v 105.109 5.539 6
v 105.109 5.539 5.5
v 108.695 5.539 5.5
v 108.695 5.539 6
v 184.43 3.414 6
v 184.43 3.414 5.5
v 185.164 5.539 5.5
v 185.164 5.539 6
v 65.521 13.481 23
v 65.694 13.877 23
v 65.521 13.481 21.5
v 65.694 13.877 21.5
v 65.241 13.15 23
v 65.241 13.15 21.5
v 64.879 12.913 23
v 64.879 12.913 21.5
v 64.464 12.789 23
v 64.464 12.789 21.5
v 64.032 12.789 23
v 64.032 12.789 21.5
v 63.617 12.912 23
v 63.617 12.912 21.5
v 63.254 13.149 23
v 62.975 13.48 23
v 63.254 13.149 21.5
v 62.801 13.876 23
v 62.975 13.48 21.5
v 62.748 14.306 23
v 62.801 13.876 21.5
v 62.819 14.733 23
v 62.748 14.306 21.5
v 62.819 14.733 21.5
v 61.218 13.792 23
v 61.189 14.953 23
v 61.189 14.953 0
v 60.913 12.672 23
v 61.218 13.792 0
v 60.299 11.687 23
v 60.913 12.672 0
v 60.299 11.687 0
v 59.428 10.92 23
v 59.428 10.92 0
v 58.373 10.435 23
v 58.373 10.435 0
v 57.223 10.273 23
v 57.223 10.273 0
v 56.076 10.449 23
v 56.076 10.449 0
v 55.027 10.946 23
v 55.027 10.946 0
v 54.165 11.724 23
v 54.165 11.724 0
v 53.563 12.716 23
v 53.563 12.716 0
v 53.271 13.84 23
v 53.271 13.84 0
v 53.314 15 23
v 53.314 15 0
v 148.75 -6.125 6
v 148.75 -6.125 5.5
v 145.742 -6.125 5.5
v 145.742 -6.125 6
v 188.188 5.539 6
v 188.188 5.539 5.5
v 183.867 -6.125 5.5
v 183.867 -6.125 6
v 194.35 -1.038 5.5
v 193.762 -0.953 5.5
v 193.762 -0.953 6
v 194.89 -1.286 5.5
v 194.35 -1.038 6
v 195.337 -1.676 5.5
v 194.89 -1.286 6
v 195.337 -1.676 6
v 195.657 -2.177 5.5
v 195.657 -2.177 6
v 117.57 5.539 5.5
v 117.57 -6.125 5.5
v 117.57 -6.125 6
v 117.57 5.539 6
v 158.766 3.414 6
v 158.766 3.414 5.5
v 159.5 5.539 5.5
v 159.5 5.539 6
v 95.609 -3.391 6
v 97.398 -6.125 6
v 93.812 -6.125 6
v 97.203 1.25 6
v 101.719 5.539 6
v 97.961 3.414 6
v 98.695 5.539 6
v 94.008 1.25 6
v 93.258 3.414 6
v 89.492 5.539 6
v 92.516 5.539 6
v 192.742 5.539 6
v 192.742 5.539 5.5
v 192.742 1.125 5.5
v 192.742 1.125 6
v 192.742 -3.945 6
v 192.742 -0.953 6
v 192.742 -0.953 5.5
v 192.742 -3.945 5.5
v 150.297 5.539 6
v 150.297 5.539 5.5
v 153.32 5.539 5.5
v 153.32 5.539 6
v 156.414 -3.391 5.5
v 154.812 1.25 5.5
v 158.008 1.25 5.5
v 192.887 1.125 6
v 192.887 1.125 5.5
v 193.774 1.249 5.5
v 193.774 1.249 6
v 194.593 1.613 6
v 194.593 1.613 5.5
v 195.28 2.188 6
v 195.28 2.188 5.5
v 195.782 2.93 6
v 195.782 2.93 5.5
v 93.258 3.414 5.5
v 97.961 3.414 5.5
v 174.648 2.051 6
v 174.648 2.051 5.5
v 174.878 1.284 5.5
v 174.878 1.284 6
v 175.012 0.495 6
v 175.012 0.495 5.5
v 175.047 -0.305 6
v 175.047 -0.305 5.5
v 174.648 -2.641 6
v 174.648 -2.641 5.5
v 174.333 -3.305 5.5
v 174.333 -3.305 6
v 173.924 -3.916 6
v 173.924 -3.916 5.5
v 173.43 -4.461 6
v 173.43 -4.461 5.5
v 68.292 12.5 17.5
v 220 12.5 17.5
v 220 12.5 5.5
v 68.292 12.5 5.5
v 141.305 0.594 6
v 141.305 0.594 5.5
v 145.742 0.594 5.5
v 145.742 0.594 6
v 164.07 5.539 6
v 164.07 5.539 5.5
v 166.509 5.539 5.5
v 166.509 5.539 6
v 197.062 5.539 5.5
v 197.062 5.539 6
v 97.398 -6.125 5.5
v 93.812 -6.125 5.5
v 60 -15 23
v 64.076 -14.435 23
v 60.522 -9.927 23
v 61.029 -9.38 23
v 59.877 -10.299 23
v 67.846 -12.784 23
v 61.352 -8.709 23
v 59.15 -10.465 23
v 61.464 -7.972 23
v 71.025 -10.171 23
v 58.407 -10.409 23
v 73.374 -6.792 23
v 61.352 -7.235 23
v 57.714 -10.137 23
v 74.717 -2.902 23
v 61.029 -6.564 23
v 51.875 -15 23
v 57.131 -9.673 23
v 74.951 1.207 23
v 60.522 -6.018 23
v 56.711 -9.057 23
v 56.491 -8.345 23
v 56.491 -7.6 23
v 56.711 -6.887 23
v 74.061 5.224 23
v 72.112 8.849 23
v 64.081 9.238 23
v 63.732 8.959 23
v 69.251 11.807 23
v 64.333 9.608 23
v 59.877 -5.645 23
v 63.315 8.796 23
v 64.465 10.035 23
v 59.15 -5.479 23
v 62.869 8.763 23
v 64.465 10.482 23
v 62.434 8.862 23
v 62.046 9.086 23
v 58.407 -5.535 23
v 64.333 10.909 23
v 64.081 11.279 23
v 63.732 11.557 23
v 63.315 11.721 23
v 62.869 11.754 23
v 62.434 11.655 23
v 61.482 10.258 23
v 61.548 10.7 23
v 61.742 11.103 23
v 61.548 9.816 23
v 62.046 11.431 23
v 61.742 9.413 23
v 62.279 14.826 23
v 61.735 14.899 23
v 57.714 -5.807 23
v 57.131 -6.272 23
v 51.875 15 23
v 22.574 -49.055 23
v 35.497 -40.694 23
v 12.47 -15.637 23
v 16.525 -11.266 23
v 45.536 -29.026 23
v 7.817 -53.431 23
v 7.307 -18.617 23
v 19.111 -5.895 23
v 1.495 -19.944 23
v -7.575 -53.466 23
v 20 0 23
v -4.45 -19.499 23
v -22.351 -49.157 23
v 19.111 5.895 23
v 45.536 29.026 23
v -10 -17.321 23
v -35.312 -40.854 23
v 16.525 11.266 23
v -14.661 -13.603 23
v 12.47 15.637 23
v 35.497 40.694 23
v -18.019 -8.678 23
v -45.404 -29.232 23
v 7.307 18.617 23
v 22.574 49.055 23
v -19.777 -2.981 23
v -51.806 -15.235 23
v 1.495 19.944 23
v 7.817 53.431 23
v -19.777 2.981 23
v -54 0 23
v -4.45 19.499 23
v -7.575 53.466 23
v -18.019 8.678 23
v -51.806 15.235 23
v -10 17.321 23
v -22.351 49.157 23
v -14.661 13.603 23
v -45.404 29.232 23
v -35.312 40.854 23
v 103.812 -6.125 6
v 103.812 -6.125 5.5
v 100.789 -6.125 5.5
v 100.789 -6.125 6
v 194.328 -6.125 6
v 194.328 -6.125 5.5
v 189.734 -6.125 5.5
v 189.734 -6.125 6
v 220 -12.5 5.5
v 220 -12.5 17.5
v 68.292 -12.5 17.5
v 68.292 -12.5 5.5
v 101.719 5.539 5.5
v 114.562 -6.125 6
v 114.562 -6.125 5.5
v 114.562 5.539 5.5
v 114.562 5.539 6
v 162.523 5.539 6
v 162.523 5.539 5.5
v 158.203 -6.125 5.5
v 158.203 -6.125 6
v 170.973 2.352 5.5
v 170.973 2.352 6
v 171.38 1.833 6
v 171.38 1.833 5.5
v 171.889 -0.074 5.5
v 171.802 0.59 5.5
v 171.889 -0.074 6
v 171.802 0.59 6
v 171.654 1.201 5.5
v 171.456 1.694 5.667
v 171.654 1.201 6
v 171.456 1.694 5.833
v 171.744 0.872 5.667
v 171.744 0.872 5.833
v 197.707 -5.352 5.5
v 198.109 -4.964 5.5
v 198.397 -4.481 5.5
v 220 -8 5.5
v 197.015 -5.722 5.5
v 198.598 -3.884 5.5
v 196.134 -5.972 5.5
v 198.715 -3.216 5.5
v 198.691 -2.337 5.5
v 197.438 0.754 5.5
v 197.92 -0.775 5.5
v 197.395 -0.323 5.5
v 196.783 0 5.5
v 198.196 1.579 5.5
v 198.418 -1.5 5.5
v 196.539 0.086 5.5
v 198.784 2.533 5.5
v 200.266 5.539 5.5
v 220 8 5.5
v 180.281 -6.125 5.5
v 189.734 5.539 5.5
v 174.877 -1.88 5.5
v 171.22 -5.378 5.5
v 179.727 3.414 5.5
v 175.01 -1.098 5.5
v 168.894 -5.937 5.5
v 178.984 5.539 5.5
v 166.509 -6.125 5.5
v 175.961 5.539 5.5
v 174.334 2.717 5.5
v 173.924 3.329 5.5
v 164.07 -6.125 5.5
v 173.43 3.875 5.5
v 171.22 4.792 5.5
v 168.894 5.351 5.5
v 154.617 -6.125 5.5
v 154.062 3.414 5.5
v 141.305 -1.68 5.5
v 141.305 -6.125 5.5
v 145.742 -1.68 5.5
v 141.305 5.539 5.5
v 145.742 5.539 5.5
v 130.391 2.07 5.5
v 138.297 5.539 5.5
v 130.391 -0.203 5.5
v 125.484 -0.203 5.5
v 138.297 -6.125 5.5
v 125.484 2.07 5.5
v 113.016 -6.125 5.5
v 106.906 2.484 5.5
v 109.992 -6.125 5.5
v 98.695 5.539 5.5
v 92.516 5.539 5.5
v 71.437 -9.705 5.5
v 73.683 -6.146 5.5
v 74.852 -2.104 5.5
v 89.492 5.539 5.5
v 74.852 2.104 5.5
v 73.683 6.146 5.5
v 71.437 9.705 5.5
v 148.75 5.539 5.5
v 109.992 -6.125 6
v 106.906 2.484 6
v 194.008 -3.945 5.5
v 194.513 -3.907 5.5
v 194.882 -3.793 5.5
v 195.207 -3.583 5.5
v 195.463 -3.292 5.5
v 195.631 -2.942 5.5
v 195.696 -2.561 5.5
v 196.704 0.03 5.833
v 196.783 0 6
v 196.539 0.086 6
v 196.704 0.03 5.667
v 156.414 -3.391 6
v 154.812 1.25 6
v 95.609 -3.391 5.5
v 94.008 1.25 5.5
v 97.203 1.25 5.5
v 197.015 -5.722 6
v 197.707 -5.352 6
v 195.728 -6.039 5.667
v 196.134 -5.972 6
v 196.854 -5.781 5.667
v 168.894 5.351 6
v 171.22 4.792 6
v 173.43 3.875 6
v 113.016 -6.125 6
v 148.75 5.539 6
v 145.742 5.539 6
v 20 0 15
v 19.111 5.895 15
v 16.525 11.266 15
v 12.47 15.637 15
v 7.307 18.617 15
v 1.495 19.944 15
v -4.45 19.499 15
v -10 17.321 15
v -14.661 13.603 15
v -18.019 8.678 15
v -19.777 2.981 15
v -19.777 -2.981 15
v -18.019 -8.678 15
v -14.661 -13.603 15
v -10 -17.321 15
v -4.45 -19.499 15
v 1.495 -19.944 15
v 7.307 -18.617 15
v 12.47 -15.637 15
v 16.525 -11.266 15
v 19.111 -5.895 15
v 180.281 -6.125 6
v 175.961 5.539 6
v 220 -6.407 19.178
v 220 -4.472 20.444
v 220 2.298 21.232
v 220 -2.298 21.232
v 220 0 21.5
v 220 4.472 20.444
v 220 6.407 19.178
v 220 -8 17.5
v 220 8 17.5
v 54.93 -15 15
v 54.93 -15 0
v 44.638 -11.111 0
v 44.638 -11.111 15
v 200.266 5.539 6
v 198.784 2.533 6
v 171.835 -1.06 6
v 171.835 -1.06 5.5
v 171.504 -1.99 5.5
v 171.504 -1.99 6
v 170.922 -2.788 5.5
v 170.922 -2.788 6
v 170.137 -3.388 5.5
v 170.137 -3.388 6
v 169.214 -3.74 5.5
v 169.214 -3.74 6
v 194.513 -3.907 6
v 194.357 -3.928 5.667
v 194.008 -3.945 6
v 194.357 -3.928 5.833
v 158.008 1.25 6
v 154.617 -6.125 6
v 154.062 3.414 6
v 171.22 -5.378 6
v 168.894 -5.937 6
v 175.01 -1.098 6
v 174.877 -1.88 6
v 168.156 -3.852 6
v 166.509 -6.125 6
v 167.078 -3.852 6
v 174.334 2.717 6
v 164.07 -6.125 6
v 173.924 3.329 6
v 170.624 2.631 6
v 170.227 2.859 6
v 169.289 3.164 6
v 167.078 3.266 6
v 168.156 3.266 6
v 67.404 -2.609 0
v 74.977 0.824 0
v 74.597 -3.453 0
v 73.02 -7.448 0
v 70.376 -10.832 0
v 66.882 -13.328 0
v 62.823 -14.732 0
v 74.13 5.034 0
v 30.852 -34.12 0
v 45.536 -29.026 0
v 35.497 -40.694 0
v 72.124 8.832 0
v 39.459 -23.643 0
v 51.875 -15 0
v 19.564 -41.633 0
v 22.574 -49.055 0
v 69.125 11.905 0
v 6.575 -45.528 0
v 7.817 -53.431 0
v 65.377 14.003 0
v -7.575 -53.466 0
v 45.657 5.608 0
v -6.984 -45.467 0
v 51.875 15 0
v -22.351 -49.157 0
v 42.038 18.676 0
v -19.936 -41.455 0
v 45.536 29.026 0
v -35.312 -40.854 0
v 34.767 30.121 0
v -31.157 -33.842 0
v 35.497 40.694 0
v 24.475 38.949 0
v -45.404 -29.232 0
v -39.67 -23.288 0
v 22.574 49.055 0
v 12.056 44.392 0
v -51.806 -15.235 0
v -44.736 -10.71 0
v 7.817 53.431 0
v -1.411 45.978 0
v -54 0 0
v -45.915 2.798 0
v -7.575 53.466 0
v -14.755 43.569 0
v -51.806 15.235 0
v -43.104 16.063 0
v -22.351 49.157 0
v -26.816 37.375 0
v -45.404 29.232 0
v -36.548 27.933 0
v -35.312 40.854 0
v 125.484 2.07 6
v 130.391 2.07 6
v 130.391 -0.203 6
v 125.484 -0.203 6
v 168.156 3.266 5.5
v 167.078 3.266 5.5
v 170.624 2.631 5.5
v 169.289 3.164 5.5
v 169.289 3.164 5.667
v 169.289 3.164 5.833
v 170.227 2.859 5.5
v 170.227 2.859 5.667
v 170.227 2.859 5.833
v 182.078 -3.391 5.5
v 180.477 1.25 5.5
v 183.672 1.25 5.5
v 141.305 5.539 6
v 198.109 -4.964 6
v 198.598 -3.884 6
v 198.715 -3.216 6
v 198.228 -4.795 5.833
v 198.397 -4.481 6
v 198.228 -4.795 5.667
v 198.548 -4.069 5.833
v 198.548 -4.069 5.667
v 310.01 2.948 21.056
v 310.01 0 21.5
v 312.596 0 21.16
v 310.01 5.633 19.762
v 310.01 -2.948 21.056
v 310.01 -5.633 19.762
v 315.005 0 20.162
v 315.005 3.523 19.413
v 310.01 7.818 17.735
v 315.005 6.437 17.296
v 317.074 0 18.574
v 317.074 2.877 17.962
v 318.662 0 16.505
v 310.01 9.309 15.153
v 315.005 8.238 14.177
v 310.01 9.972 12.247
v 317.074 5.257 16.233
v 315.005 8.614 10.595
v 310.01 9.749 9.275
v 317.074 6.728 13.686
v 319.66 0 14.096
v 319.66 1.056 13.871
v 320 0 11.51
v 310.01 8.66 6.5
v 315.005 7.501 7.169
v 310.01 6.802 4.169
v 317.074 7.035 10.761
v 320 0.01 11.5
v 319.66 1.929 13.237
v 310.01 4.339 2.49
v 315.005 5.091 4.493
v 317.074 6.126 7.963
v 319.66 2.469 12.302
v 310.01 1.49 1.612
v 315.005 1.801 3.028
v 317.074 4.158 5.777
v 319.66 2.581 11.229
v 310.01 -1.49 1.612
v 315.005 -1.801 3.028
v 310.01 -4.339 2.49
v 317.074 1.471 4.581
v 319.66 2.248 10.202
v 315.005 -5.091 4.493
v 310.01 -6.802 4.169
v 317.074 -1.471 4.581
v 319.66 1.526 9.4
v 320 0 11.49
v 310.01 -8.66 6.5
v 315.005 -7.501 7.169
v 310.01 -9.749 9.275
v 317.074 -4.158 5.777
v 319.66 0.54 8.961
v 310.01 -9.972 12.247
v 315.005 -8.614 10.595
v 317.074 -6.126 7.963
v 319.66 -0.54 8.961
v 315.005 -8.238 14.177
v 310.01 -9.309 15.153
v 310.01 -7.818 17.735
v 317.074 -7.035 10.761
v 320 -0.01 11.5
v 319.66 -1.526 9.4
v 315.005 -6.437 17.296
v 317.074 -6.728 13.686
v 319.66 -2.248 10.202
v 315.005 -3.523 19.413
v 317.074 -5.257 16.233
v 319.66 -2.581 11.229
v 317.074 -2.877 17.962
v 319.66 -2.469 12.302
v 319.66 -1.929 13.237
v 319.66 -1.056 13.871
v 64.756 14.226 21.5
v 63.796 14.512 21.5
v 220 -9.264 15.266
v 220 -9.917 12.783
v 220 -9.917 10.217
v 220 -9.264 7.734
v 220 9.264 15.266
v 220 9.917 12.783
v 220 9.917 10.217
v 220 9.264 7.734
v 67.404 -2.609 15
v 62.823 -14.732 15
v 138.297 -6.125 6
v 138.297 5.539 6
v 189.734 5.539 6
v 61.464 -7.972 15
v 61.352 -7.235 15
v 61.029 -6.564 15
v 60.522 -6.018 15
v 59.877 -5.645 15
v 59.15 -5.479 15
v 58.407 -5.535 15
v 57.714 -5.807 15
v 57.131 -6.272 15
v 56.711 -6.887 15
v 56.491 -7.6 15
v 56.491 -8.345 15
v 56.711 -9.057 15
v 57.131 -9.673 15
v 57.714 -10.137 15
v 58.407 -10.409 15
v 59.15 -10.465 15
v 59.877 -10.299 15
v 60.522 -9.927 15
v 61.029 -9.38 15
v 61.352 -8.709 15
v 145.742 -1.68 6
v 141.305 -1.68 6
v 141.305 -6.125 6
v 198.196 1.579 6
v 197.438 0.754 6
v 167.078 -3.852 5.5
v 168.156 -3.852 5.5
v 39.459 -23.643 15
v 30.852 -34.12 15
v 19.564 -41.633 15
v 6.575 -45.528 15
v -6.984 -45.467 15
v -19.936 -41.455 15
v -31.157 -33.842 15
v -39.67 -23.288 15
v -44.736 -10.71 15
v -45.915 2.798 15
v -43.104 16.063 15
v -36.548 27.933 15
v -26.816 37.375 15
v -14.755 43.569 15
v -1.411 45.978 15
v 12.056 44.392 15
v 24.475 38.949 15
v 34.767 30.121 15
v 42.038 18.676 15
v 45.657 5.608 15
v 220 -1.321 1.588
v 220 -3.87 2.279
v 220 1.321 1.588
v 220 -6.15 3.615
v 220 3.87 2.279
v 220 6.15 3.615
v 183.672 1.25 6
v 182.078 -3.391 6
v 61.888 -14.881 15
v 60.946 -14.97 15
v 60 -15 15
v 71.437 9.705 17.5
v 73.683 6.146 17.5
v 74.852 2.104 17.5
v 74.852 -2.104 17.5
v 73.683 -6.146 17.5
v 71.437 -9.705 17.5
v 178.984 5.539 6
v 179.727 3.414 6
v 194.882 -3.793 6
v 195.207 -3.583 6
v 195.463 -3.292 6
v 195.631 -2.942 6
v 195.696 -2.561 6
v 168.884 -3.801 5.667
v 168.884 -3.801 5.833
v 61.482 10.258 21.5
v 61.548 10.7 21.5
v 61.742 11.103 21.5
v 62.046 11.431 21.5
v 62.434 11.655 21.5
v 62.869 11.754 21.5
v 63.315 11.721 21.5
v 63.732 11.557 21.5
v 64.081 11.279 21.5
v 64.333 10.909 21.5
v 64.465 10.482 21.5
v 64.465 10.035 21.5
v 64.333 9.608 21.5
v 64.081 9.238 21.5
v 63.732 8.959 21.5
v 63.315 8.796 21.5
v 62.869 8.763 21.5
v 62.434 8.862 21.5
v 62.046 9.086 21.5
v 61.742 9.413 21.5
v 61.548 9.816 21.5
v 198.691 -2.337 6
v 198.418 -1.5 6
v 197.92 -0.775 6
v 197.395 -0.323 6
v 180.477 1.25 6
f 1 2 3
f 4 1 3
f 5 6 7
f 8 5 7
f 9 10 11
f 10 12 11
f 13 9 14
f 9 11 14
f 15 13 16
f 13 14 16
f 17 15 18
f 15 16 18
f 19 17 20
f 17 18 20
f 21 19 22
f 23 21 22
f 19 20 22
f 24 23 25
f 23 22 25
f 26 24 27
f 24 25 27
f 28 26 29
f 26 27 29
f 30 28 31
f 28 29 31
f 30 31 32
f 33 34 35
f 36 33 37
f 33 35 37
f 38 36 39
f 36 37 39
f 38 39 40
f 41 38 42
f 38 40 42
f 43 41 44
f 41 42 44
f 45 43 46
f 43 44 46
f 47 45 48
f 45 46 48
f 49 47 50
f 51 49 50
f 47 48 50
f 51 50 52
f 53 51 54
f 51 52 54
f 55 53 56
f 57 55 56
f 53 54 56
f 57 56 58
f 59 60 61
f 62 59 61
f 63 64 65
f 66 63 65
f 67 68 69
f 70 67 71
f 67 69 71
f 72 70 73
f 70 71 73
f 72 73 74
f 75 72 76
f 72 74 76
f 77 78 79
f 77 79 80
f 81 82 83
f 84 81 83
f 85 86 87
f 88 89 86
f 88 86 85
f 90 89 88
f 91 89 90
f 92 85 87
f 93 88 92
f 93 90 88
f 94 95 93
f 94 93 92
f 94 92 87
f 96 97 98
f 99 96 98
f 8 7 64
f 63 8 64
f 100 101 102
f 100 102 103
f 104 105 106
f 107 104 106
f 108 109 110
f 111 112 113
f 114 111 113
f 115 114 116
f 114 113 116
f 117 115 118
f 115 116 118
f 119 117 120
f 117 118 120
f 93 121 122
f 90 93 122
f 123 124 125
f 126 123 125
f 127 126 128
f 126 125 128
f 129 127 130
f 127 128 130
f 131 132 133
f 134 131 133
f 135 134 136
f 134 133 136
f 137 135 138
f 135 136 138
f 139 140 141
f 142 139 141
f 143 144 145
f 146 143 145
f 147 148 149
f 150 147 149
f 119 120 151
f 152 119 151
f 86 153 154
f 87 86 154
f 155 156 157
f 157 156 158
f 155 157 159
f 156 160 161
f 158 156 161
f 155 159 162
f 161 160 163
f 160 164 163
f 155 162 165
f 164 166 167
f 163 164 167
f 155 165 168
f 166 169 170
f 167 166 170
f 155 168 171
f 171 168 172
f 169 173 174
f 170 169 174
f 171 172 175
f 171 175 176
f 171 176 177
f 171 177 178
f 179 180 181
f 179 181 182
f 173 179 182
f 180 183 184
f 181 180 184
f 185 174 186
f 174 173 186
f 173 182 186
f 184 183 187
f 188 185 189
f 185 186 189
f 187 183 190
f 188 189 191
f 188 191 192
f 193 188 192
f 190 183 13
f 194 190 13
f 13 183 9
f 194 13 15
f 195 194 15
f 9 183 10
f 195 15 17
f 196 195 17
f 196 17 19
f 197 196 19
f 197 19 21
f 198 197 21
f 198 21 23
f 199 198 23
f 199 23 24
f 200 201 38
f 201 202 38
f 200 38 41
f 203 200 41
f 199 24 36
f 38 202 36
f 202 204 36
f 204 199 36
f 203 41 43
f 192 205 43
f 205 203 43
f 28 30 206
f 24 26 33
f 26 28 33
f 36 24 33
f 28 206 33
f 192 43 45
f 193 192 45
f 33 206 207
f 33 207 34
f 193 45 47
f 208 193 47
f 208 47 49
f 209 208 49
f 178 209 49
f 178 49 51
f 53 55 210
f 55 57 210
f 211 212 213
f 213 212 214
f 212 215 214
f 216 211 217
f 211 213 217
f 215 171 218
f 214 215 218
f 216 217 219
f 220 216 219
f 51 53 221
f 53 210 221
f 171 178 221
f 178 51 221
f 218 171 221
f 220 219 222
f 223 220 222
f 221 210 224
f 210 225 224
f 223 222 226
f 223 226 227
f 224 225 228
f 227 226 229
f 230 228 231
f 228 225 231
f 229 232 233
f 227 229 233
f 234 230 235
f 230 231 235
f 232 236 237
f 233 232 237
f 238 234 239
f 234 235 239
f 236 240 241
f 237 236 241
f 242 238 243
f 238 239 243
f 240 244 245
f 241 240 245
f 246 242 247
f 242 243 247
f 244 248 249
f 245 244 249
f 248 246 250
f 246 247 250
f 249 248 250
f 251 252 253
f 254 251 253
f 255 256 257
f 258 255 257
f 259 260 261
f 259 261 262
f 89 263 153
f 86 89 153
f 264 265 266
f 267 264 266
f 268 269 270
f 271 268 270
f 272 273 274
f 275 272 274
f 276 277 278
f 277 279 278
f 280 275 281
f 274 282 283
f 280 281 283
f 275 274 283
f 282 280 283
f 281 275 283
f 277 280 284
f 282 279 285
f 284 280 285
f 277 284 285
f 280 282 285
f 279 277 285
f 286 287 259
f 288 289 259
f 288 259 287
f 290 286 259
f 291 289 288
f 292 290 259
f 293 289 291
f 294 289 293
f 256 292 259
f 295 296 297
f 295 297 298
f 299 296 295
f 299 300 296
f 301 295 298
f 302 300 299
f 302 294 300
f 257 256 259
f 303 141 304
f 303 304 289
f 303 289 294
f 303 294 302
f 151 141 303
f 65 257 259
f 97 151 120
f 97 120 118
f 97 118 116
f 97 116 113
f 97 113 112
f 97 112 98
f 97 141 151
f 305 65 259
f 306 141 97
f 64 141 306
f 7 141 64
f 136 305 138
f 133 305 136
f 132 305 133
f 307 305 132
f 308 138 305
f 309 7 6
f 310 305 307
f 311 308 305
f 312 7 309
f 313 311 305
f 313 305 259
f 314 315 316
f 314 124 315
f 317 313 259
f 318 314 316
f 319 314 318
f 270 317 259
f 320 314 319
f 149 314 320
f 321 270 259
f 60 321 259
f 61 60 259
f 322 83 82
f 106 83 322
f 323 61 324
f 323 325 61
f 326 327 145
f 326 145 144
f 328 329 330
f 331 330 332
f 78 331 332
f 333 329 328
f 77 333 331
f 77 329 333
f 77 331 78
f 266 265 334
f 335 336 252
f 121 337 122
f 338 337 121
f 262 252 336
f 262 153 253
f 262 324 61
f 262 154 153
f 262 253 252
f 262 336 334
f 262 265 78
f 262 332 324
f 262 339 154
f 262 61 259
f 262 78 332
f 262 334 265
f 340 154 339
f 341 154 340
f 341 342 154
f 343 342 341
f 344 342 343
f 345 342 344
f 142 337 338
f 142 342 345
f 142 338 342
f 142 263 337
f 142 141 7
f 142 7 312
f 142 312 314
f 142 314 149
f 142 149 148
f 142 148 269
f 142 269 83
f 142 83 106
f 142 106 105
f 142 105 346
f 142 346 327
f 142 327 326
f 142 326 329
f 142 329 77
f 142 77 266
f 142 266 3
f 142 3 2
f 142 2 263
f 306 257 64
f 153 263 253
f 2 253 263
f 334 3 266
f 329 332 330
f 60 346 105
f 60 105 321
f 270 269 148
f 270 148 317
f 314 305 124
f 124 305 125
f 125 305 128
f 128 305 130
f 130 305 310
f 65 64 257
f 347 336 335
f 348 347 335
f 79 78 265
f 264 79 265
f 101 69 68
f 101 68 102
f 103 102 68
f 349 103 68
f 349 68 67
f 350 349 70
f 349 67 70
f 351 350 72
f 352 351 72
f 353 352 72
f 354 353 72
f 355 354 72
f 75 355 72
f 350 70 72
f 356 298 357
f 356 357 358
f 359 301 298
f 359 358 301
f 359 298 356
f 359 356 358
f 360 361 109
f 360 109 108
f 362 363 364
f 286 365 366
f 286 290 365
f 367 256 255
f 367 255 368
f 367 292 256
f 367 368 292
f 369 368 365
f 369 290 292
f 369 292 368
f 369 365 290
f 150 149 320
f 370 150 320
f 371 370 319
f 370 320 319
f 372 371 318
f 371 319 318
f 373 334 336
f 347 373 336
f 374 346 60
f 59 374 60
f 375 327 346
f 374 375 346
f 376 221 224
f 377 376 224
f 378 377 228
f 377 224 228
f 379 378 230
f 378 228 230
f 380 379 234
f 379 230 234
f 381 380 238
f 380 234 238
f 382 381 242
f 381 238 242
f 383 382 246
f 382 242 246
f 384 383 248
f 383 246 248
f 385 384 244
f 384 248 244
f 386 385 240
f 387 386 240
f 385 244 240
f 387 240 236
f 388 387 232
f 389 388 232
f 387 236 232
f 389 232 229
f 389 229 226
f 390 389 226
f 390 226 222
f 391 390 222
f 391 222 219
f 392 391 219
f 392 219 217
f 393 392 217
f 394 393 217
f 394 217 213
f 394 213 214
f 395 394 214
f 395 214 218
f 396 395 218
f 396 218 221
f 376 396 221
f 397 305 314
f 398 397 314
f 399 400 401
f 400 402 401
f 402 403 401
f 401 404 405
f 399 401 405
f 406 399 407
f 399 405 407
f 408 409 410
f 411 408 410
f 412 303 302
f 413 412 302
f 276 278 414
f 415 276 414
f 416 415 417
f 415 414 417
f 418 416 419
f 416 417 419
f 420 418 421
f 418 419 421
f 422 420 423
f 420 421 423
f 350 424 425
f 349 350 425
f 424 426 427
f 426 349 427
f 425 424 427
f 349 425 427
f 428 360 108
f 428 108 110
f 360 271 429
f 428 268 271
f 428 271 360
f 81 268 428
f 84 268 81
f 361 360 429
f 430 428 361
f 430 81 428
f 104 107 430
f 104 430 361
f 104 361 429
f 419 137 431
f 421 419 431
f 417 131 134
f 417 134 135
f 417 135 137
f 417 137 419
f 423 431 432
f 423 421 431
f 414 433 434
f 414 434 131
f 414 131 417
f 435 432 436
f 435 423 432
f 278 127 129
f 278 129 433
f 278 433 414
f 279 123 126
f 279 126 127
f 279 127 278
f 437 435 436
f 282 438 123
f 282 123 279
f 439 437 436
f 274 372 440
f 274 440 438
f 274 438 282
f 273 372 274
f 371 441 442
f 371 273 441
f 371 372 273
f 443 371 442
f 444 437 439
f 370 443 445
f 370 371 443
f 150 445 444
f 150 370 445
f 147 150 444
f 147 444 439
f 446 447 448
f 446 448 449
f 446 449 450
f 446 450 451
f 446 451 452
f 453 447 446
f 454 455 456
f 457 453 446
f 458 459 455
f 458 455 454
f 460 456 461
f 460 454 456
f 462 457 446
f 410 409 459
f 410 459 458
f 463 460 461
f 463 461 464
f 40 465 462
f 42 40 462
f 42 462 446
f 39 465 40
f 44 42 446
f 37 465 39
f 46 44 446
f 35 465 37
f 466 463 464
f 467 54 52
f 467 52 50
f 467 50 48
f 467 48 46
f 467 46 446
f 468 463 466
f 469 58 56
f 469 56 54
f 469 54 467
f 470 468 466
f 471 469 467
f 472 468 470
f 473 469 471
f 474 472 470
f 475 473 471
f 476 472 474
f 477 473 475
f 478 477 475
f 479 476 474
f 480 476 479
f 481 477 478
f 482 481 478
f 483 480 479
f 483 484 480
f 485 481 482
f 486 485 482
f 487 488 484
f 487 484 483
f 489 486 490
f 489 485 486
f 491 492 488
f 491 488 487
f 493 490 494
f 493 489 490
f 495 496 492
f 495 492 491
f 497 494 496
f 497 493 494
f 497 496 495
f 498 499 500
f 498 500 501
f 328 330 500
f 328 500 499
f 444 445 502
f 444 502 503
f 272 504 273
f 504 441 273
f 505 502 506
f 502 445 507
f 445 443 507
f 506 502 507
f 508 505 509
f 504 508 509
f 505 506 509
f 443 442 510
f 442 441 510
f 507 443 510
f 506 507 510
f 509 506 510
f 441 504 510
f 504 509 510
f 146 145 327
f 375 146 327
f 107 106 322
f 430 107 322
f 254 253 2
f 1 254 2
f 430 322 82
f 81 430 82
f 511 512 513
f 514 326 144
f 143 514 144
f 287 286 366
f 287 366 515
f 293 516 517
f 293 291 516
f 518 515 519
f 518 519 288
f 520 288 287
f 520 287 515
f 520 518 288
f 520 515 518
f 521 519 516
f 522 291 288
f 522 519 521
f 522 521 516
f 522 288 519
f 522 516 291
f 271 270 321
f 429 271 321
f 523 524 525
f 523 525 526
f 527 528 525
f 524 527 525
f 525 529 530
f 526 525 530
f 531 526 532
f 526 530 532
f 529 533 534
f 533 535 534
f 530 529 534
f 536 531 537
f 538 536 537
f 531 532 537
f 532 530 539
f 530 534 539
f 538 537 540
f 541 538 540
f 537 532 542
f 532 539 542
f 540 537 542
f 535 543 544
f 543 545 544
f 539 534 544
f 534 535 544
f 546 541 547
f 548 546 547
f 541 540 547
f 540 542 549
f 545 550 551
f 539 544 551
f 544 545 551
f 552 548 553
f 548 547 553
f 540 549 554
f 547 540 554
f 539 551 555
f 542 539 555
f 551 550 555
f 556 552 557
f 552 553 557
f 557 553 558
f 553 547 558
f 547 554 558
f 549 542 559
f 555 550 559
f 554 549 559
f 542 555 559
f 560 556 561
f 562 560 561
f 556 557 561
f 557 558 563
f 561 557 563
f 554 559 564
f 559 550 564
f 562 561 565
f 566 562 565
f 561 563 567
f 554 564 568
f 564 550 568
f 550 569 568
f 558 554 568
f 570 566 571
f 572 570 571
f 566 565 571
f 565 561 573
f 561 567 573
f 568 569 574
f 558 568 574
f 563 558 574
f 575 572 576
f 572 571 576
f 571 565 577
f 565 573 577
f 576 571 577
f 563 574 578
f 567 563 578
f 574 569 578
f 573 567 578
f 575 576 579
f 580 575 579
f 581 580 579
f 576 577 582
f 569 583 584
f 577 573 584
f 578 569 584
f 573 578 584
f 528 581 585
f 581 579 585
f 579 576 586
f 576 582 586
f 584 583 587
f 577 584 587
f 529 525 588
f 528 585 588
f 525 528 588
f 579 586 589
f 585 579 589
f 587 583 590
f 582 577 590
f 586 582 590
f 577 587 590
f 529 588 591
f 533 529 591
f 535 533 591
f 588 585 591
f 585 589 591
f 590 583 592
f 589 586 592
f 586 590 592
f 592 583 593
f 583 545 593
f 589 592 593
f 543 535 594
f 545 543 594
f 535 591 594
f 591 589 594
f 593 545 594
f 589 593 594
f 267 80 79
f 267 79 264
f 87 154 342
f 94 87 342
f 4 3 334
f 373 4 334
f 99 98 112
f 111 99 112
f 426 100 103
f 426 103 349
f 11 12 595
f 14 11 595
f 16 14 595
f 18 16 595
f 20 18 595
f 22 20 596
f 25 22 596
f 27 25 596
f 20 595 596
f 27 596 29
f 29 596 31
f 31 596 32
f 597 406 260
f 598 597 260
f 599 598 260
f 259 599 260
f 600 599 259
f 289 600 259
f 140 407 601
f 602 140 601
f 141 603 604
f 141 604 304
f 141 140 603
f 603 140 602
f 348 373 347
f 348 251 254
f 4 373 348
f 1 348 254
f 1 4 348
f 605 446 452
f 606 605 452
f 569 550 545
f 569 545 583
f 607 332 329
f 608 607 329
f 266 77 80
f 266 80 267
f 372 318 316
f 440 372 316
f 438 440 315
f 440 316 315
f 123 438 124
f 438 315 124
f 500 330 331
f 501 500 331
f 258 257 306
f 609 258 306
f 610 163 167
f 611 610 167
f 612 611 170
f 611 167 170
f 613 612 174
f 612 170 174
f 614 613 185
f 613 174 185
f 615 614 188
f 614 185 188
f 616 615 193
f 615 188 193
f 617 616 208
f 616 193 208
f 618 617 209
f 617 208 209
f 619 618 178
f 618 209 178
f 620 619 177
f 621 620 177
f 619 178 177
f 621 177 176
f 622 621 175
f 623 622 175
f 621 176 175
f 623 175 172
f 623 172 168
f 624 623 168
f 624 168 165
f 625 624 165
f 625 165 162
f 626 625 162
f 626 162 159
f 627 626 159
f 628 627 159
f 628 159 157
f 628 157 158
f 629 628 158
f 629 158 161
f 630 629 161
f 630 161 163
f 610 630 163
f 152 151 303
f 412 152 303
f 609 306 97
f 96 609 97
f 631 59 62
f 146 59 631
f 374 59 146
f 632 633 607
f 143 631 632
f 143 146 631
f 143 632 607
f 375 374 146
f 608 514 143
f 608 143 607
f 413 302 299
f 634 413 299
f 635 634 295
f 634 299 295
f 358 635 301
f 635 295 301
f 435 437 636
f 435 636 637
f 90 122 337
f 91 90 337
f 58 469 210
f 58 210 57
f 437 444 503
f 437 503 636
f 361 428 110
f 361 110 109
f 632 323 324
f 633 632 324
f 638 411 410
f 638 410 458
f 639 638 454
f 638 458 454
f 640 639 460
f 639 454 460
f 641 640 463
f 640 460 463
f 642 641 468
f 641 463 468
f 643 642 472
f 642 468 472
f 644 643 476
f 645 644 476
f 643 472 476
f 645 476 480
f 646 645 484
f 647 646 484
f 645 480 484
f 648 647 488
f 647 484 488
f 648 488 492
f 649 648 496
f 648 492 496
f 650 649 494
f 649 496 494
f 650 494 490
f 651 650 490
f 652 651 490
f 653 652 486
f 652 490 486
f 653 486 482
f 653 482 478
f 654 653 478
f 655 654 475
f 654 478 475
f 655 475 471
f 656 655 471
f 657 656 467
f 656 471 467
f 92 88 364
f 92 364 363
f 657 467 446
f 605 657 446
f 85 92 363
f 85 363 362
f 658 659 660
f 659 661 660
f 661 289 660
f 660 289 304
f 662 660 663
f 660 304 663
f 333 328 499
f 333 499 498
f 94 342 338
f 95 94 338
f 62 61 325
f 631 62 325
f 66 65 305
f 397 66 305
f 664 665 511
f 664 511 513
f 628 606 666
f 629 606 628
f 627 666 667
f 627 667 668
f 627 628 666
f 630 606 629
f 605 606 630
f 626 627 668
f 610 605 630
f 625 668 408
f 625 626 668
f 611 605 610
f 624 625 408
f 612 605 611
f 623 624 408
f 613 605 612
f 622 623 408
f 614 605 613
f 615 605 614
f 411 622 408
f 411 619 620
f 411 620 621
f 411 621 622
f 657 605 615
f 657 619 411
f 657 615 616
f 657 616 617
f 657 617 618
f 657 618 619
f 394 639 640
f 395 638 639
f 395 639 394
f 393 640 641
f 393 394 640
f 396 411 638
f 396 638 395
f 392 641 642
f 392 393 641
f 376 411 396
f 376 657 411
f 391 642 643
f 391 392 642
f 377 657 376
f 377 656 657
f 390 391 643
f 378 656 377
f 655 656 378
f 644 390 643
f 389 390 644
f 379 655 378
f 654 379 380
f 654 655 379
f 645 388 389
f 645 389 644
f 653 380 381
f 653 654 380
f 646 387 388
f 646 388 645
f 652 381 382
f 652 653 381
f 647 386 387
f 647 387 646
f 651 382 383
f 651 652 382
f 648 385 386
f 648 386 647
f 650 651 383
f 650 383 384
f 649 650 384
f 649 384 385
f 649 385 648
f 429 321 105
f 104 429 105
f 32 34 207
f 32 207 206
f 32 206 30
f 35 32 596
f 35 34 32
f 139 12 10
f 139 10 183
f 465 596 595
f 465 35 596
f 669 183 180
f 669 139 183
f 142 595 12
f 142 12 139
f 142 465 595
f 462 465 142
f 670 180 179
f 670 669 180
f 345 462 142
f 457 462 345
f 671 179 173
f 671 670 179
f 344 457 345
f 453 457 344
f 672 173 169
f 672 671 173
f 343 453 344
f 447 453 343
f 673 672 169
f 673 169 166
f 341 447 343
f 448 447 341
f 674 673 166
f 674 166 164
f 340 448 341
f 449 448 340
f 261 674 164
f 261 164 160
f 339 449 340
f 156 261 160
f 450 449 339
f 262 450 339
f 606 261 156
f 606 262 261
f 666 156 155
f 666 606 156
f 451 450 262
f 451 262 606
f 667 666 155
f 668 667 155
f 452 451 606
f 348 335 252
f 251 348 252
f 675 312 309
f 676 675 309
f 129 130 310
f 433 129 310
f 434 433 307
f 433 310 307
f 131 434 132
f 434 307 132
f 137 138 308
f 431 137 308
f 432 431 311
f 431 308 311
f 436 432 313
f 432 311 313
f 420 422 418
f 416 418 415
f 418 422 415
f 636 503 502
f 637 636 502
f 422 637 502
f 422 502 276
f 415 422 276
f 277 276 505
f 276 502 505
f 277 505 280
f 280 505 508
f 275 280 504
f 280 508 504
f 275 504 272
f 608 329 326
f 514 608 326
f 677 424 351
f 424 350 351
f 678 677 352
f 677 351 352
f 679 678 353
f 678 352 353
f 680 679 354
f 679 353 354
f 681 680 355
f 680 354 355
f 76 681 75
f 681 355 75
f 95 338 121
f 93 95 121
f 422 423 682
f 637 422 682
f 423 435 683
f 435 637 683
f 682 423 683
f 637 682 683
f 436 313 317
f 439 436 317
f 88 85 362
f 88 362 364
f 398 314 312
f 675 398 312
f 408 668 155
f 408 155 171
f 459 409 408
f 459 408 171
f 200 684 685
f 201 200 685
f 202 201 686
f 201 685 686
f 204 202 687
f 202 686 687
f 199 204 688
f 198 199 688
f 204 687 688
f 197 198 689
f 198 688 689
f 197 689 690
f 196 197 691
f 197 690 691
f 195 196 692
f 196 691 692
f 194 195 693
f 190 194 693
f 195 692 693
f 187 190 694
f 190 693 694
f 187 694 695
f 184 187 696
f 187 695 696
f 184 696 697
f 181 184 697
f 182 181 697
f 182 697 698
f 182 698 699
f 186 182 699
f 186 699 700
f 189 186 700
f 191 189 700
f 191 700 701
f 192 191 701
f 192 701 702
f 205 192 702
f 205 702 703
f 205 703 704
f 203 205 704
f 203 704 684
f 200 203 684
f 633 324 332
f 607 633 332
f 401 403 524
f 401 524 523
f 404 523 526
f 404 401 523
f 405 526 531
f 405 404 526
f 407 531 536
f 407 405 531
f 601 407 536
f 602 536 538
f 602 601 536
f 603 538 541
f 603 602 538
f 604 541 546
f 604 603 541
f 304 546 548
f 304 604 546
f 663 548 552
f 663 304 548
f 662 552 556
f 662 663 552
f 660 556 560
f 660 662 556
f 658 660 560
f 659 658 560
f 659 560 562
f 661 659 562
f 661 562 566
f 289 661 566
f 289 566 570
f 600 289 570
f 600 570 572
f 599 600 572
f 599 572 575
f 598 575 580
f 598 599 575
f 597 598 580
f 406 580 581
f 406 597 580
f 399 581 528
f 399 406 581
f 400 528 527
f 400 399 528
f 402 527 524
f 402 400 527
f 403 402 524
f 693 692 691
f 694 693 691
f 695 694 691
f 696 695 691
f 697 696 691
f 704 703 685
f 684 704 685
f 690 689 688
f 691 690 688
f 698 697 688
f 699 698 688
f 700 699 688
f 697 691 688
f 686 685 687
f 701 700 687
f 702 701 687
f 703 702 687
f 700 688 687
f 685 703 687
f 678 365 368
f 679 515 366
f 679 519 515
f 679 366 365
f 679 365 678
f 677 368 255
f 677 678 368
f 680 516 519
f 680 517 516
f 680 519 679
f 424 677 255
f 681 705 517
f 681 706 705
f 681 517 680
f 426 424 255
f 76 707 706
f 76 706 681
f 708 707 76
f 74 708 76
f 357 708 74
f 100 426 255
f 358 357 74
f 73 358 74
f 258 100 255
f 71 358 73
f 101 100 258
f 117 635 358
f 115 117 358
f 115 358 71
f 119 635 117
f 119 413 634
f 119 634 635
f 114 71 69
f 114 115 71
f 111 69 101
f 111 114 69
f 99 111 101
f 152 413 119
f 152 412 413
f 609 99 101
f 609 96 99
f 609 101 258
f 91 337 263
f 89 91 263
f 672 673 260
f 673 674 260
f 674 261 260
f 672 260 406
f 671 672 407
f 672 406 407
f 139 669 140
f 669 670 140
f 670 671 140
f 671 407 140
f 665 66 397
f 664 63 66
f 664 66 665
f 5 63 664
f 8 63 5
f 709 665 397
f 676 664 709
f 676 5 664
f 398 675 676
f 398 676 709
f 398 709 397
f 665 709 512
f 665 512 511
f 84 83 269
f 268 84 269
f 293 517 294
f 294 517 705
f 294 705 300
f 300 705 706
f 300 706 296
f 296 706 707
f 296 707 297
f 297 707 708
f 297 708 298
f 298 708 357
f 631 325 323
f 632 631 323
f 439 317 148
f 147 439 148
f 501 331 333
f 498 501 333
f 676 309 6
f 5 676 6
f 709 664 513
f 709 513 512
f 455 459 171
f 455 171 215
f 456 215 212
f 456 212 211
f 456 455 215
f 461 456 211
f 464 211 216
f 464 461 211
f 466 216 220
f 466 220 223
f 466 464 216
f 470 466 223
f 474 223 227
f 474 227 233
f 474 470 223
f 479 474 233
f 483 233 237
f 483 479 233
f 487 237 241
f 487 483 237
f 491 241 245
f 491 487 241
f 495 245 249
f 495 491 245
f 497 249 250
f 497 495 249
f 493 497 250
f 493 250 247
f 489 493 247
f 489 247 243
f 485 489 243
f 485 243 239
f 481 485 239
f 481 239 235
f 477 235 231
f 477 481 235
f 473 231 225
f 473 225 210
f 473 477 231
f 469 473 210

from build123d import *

# Parameters (mm, degrees)
BOSS_EXTRUDE1_DEPTH           = 23
CUT_EXTRUDE1_DEPTH            = 15
BOSS_EXTRUDE2_REACH           = 282.216
BOSS_EXTRUDE2_END_RADIUS      = 15
SKETCH3_W                     = 12
SKETCH3_H                     = 25
CUT_EXTRUDE2_DEPTH            = 0.5
BOSS_EXTRUDE3_DEPTH           = 0.5
CUT_EXTRUDE3_DEPTH            = 0.5
BOSS_EXTRUDE4_DEPTH           = 0.5
CUT_EXTRUDE4_DEPTH            = 0.5
BOSS_EXTRUDE5_DEPTH           = 0.5
CUT_EXTRUDE5_DEPTH            = 0.5
BOSS_EXTRUDE6_DEPTH           = 0.5
CUT_EXTRUDE6_DEPTH            = 0.5
BOSS_EXTRUDE7_DEPTH           = 0.5
CUT_EXTRUDE7_DEPTH            = 0.5
CUT_EXTRUDE8_DEPTH            = 0.5
SKETCH16_W                    = 4.90625
SKETCH16_H                    = 2.2734375
CUT_EXTRUDE9_DEPTH            = 0.5
SKETCH17_W                    = 3.0078125
SKETCH17_H                    = 11.6640625
CUT_EXTRUDE10_DEPTH           = 0.5
SKETCH18_W                    = 100
SKETCH18_H                    = 10
F_8_0_8_DIAMETER_HOLE1_D      = 8
F_5_0_5_DIAMETER_HOLE1_D      = 5
TAP_DRILL_FOR_M39_HELICOIL1_D = 40
F_3_0_3_DIAMETER_HOLE1_D      = 3
F_3_0_3_DIAMETER_HOLE1_DEPTH  = 1.5
FILLET1_R                     = 1.412284342
FILLET2_R                     = 2.07905533
FILLET3_R                     = 3.070846318
FILLET4_R                     = 3.22526269
FILLET5_R                     = 3.441550783
FILLET6_START                 = 5.5
FILLET6_DEPTH                 = 1.5
FILLET7_R                     = 9.990039186
FILLET8_START                 = 5.5
FILLET8_DEPTH                 = 1.5


with BuildPart() as part:
    # Sketch1 → Boss-Extrude1 (new body)
    with BuildSketch(Plane(origin=(0, 0, 0), x_dir=(-1, 0, 0), z_dir=(0, 0, -1))):
        with BuildLine():
            Line((-60, -15), (-51.874849397, -15))
            ThreePointArc((-51.874849397, -15), (54, 0), (-51.874849397, 15))
            Line((-51.874849397, 15), (-60, 15))
            ThreePointArc((-60, 15), (-75, 0), (-60, -15))
        make_face()
    extrude(amount=-BOSS_EXTRUDE1_DEPTH)

    # Sketch2 → Cut-Extrude1 (cut)
    with BuildSketch(Plane(origin=(0, 0, 0), x_dir=(-1, 0, 0), z_dir=(0, 0, -1))):
        with BuildLine():
            Line((-60, -15), (-54.929646445, -15))
            Line((-54.929646445, -15), (-44.637919846, -11.111080587))
            ThreePointArc((-44.637919846, -11.111080587), (45.9148086, 2.798276473), (-45.656867784, 5.608067777))
            Line((-45.656867784, 5.608067777), (-67.403963318, -2.609474848))
            Line((-67.403963318, -2.609474848), (-62.823277674, -14.731907656))
            ThreePointArc((-62.823277674, -14.731907656), (-61.417988922, -14.932826505), (-60, -15))
        make_face()
    extrude(amount=-CUT_EXTRUDE1_DEPTH, mode=Mode.SUBTRACT)

    # Boss-Extrude2: up to this cylinder (the profile starts outside it)
    boss_extrude2_end = Plane(origin=(60, 0, 11.5), z_dir=(0, 0, -1)) * Cylinder(BOSS_EXTRUDE2_END_RADIUS, 595.432, mode=Mode.PRIVATE)
    # Sketch3 → Boss-Extrude2 (add, up to the surface)
    with BuildSketch(Plane(origin=(220, 0, 0), x_dir=(0, 0, -1), z_dir=(1, 0, 0)), mode=Mode.PRIVATE) as boss_extrude2_sk1:
        with Locations((-11.5, 0)):
            Rectangle(SKETCH3_W, SKETCH3_H)
    boss_extrude2_tool1 = extrude(boss_extrude2_sk1.sketch, amount=-BOSS_EXTRUDE2_REACH, mode=Mode.PRIVATE) - boss_extrude2_end
    add(boss_extrude2_tool1.solids().sort_by_distance((220, 0, 11.5))[0])

    # Sketch4 → Cut-Extrude2 (cut)
    with BuildSketch(Plane(origin=(0, 0, 5.5), x_dir=(-1, 0, 0), z_dir=(0, 0, -1))):
        with BuildLine():
            Line((-164.0703125, -6.125), (-164.0703125, 5.5390625))
            Line((-164.0703125, 5.5390625), (-169.8671875, 5.5390625))
            add(Edge.make_bspline(
                [(-173.4296875, 3.875), (-172.4921875, 4.78125), (-171.1796875, 5.16015625), (-169.8671875, 5.5390625)],
                knots=[0, 0, 0, 0, 1, 1, 1, 1], degree=3))
            ThreePointArc((-173.4296875, 3.875), (-174.140331686, 3.030547983), (-174.6484375, 2.05078125))
            ThreePointArc((-174.6484375, 2.05078125), (-174.956946445, 0.891533774), (-175.046875, -0.3046875))
            ThreePointArc((-175.046875, -0.3046875), (-174.955491082, -1.491049482), (-174.6484375, -2.640625))
            ThreePointArc((-174.6484375, -2.640625), (-174.139959679, -3.618334726), (-173.4296875, -4.4609375))
            add(Edge.make_bspline(
                [(-169.8984375, -6.125), (-171.19921875, -5.74609375), (-172.5, -5.3671875), (-173.4296875, -4.4609375)],
                knots=[0, 0, 0, 0, 1, 1, 1, 1], degree=3))
            Line((-169.8984375, -6.125), (-164.0703125, -6.125))
        make_face()
    extrude(amount=-CUT_EXTRUDE2_DEPTH, mode=Mode.SUBTRACT)

    # Sketch5 → Boss-Extrude3 (add)
    with BuildSketch(Plane(origin=(0, 0, 6), x_dir=(-1, 0, 0), z_dir=(0, 0, -1))):
        with BuildLine():
            Line((-167.078125, -3.8515625), (-168.15625, -3.8515625))
            add(Edge.make_bspline(
                [(-171.9453125, -2.0390625), (-170.9765625, -2.9453125), (-170.0078125, -3.8515625), (-168.15625, -3.8515625)],
                knots=[0, 0, 0, 0, 1, 1, 1, 1], degree=3))
            add(Edge.make_bspline(
                [(-170.97265625, 2.3515625), (-171.943858604, 1.438866312), (-171.9453125, -0.299479167), (-171.9453125, -2.0390625)],
                knots=[0, 0, 0, 0, 1, 1, 1, 1], degree=3))
            add(Edge.make_bspline(
                [(-168.15625, 3.265625), (-169.385416667, 3.265625), (-170.32421875, 2.9609375), (-170.97265625, 2.3515625)],
                knots=[0, 0, 0, 0, 1, 1, 1, 1], degree=3))
            Line((-168.15625, 3.265625), (-167.078125, 3.265625))
            Line((-167.078125, 3.265625), (-167.078125, -3.8515625))
        make_face()
    extrude(amount=BOSS_EXTRUDE3_DEPTH)

    # Sketch6 → Cut-Extrude3 (cut)
    with BuildSketch(Plane(origin=(0, 0, 5.5), x_dir=(-1, 0, 0), z_dir=(0, 0, -1))):
        with BuildLine():
            Line((-192.7421875, 1.125), (-193.59375, 1.125))
            add(Edge.make_bspline(
                [(-195.211624157, 1.766123282), (-194.769989022, 1.445644688), (-194.328505801, 1.125), (-193.59375, 1.125)],
                knots=[0, 0, 0, 0, 1, 1, 1, 1], degree=3))
            Line((-195.211624157, 1.766123282), (-197.0625, 5.5390625))
            Line((-197.0625, 5.5390625), (-200.265625, 5.5390625))
            Line((-200.265625, 5.5390625), (-198.139271979, 1.225312831))
            add(Edge.make_bspline(
                [(-196.5390625, 0.0859375), (-197.158971594, 0.22718261), (-197.648837569, 0.72703147), (-198.139271979, 1.225312831)],
                knots=[0, 0, 0, 0, 1, 1, 1, 1], degree=3))
            add(Edge.make_bspline(
                [(-198.78125, -1.75), (-198.22265625, -1.0078125), (-197.6640625, -0.265625), (-196.5390625, 0.0859375)],
                knots=[0, 0, 0, 0, 1, 1, 1, 1], degree=3))
            add(Edge.make_bspline(
                [(-197.70703125, -5.3515625), (-198.670816297, -4.657637266), (-198.78125, -3.25), (-198.78125, -1.75)],
                knots=[0, 0, 0, 0, 1, 1, 1, 1], degree=3))
            add(Edge.make_bspline(
                [(-194.328125, -6.125), (-195.864583333, -6.125), (-196.990885417, -5.8671875), (-197.70703125, -5.3515625)],
                knots=[0, 0, 0, 0, 1, 1, 1, 1], degree=3))
            Line((-194.328125, -6.125), (-189.734375, -6.125))
            Line((-189.734375, -6.125), (-189.734375, 5.5390625))
            Line((-189.734375, 5.5390625), (-192.7421875, 5.5390625))
            Line((-192.7421875, 5.5390625), (-192.7421875, 1.125))
        make_face()
    extrude(amount=-CUT_EXTRUDE3_DEPTH, mode=Mode.SUBTRACT)

    # Sketch7 → Boss-Extrude4 (add)
    with BuildSketch(Plane(origin=(0, 0, 6), x_dir=(-1, 0, 0), z_dir=(0, 0, -1))):
        with BuildLine():
            Line((-192.7421875, -0.953125), (-192.7421875, -3.9453125))
            Line((-192.7421875, -3.9453125), (-194.0078125, -3.9453125))
            add(Edge.make_bspline(
                [(-195.7734375, -3.2578125), (-195.36328125, -3.6015625), (-194.953125, -3.9453125), (-194.0078125, -3.9453125)],
                knots=[0, 0, 0, 0, 1, 1, 1, 1], degree=3))
            add(Edge.make_bspline(
                [(-194.953125, -0.953125), (-195.498672634, -1.420737257), (-195.7734375, -2.1875), (-195.7734375, -3.2578125)],
                knots=[0, 0, 0, 0, 1, 1, 1, 1], degree=3))
            Line((-194.953125, -0.953125), (-192.7421875, -0.953125))
        make_face()
    extrude(amount=BOSS_EXTRUDE4_DEPTH)

    # Sketch8 → Cut-Extrude4 (cut)
    with BuildSketch(Plane(origin=(0, 0, 5.5), x_dir=(-1, 0, 0), z_dir=(0, 0, -1))):
        Polygon((-184.4296875, 3.4140625), (-185.1640625, 5.5390625), (-188.1875, 5.5390625), (-183.8671875, -6.125), (-180.28125, -6.125), (-175.9609375, 5.5390625), (-178.984375, 5.5390625), (-179.7265625, 3.4140625), align=None)
    extrude(amount=-CUT_EXTRUDE4_DEPTH, mode=Mode.SUBTRACT)

    # Sketch9 → Boss-Extrude5 (add)
    with BuildSketch(Plane(origin=(0, 0, 6), x_dir=(-1, 0, 0), z_dir=(0, 0, -1))):
        Polygon((-180.4765625, 1.25), (-182.078125, -3.390625), (-183.671875, 1.25), align=None)
    extrude(amount=BOSS_EXTRUDE5_DEPTH)

    # Sketch10 → Cut-Extrude5 (cut)
    with BuildSketch(Plane(origin=(0, 0, 5.5), x_dir=(-1, 0, 0), z_dir=(0, 0, -1))):
        Polygon((-158.765625, 3.4140625), (-159.5, 5.5390625), (-162.5234375, 5.5390625), (-158.203125, -6.125), (-154.6171875, -6.125), (-150.296875, 5.5390625), (-153.3203125, 5.5390625), (-154.0625, 3.4140625), align=None)
    extrude(amount=-CUT_EXTRUDE5_DEPTH, mode=Mode.SUBTRACT)

    # Sketch11 → Boss-Extrude6 (add)
    with BuildSketch(Plane(origin=(0, 0, 6), x_dir=(-1, 0, 0), z_dir=(0, 0, -1))):
        Polygon((-154.8125, 1.25), (-156.4140625, -3.390625), (-158.0078125, 1.25), align=None)
    extrude(amount=BOSS_EXTRUDE6_DEPTH)

    # Sketch12 → Cut-Extrude6 (cut)
    with BuildSketch(Plane(origin=(0, 0, 5.5), x_dir=(-1, 0, 0), z_dir=(0, 0, -1))):
        Polygon((-97.9609375, 3.4140625), (-98.6953125, 5.5390625), (-101.71875, 5.5390625), (-97.3984375, -6.125), (-93.8125, -6.125), (-89.4921875, 5.5390625), (-92.515625, 5.5390625), (-93.2578125, 3.4140625), align=None)
    extrude(amount=-CUT_EXTRUDE6_DEPTH, mode=Mode.SUBTRACT)

    # Sketch13 → Boss-Extrude7 (add)
    with BuildSketch(Plane(origin=(0, 0, 6), x_dir=(-1, 0, 0), z_dir=(0, 0, -1))):
        Polygon((-94.0078125, 1.25), (-95.609375, -3.390625), (-97.203125, 1.25), align=None)
    extrude(amount=BOSS_EXTRUDE7_DEPTH)

    # Sketch14 → Cut-Extrude7 (cut)
    with BuildSketch(Plane(origin=(0, 0, 5.5), x_dir=(-1, 0, 0), z_dir=(0, 0, -1))):
        Polygon((-138.296875, -6.125), (-138.296875, 5.5390625), (-141.3046875, 5.5390625), (-141.3046875, 0.59375), (-145.7421875, 0.59375), (-145.7421875, 5.5390625), (-148.75, 5.5390625), (-148.75, -6.125), (-145.7421875, -6.125), (-145.7421875, -1.6796875), (-141.3046875, -1.6796875), (-141.3046875, -6.125), align=None)
    extrude(amount=-CUT_EXTRUDE7_DEPTH, mode=Mode.SUBTRACT)

    # Sketch15 → Cut-Extrude8 (cut)
    with BuildSketch(Plane(origin=(0, 0, 5.5), x_dir=(-1, 0, 0), z_dir=(0, 0, -1))):
        Polygon((-100.7890625, -6.125), (-105.109375, 5.5390625), (-108.6953125, 5.5390625), (-113.015625, -6.125), (-109.9921875, -6.125), (-106.90625, 2.484375), (-103.8125, -6.125), align=None)
    extrude(amount=-CUT_EXTRUDE8_DEPTH, mode=Mode.SUBTRACT)

    # Sketch16 → Cut-Extrude9 (cut)
    with BuildSketch(Plane(origin=(0, 0, 5.5), x_dir=(-1, 0, 0), z_dir=(0, 0, -1))):
        with Locations((-127.9375, 0.93359375)):
            Rectangle(SKETCH16_W, SKETCH16_H)
    extrude(amount=-CUT_EXTRUDE9_DEPTH, mode=Mode.SUBTRACT)

    # Sketch17 → Cut-Extrude10 (cut)
    with BuildSketch(Plane(origin=(0, 0, 5.5), x_dir=(-1, 0, 0), z_dir=(0, 0, -1))):
        with Locations((-116.06640625, -0.29296875)):
            Rectangle(SKETCH17_W, SKETCH17_H)
    extrude(amount=-CUT_EXTRUDE10_DEPTH, mode=Mode.SUBTRACT)

    # Sketch18 → Revolve1 (revolve)
    with BuildSketch(Plane(origin=(0, 0, 11.5), x_dir=(-1, 0, 0), z_dir=(0, 0, -1)), mode=Mode.PRIVATE) as revolve1_sk:
        with Locations((-270, 5)):
            Rectangle(SKETCH18_W, SKETCH18_H)
    revolve(revolve1_sk.sketch.rotate(Axis((320, 0, 11.5), (-1, 0, 0)), 270), axis=Axis((320, 0, 11.5), (-1, 0, 0)))

    # Ø8.0 (8) Diameter Hole1 (through all)
    with Locations(Plane.XY.offset(23)):
        with Locations((57.24744785, 14.27339184)):
            Hole(F_8_0_8_DIAMETER_HOLE1_D / 2)

    # Ø5.0 (5) Diameter Hole1 (through all)
    with Locations(Plane(origin=(0, 0, 15), x_dir=(-1, 0, 0), z_dir=(0, 0, -1))):
        with Locations((-58.963500383, -7.972178032)):
            Hole(F_5_0_5_DIAMETER_HOLE1_D / 2)

    # Tap Drill for M39 Helicoil1 (through all)
    with Locations(Plane(origin=(0, 0, 15), x_dir=(-1, 0, 0), z_dir=(0, 0, -1))):
        with Locations((0, 0)):
            Hole(TAP_DRILL_FOR_M39_HELICOIL1_D / 2)

    # Ø3.0 (3) Diameter Hole1
    with Locations(Plane.XY.offset(23)):
        with Locations((62.98151216, 10.258356786), (64.24744785, 14.27339184)):
            Hole(F_3_0_3_DIAMETER_HOLE1_D / 2, depth=F_3_0_3_DIAMETER_HOLE1_DEPTH)

    # Fillet1
    fillet1_edges = [part.edges().sort_by_distance(p)[0] for p in [
        (195.7734375, -3.2578125, 5.75),
    ]]
    fillet(fillet1_edges, radius=FILLET1_R)

    # Fillet2
    # the kernel refuses this fillet: 2.07905533 mm, written as the material it takes off along each edge
    with BuildSketch(Plane(origin=(194.953125, -0.953125, 6), x_dir=(0.4983238238531012, -0.8669909841402178, 0), z_dir=(0, 0, -1))) as fillet2_piece_1:
        with BuildLine():
            CenterArc((1.208738801, 2.06911578), FILLET2_R, 209.8891669, 65.715646275)
            Line((-0.593783426, 1.033072978), (-0.62983387, 1.012352122))
            Line((-0.62983387, 1.012352122), (-0.036050445, -0.020720856))
            Line((-0.036050445, -0.020720856), (-0.013886584, -0.039193765))
            ThreePointArc((-0.013886584, -0.039193765), (0.708491184, -0.153595229), (1.415853949, -0.041382316))
            Line((1.415853949, -0.041382316), (1.411792867, 0))
        make_face()
    extrude(amount=4.029482168, mode=Mode.SUBTRACT)

    # Fillet3
    fillet3_edges = [part.edges().sort_by_distance(p)[0] for p in [
        (198.78125, -1.75, 5.75),
    ]]
    fillet(fillet3_edges, radius=FILLET3_R)

    # Fillet4
    # the kernel refuses this fillet: 3.22526269 mm, written as the material it takes off along each edge
    with BuildSketch(Plane(origin=(195.211624157, 1.766123282, -0.52885706), x_dir=(0.44042499365627896, 0.8977894101418588, 0), z_dir=(0, 0, 1))) as fillet4_piece_1:
        with BuildLine():
            CenterArc((1.29613147, 3.22526269), FILLET4_R, 206.131000545, 63.868999455)
            Line((-1.599475218, 1.80477639), (-1.889035887, 1.66272776))
            ThreePointArc((-1.889035887, 1.66272776), (-1.577706578, 1.028094938), (-0.150929453, -0.285032444))
            Line((-0.150929453, -0.285032444), (0, -0.322526269))
            Line((0, -0.322526269), (1.29613147, -0.322526269))
            Line((1.29613147, -0.322526269), (1.29613147, 0))
        make_face()
    extrude(amount=6.52885706, mode=Mode.SUBTRACT)

    # Fillet5
    # the kernel refuses this fillet: 3.441550783 mm, written as the material it takes off along each edge
    with BuildSketch(Plane(origin=(171.9453125, -2.0390625, 6), x_dir=(-0.028598923241017205, 0.9995909671407873, 0), z_dir=(0, 0, -1))) as fillet5_piece_1:
        with BuildLine():
            CenterArc((1.756179381, -3.435147573), FILLET5_R, 86.504359351, 82.499227166)
            Line((-1.62218152, -2.778680198), (-1.689748738, -2.76555085))
            ThreePointArc((-1.689748738, -2.76555085), (-1.0632901, -1.228131616), (-0.051589553, 0.045565631))
            Line((-0.051589553, 0.045565631), (-0.001968493, 0.068802862))
            ThreePointArc((-0.001968493, 0.068802862), (0.982292689, 0.090203195), (1.970216473, 0.068702951))
            Line((1.970216473, 0.068702951), (1.966019668, 0))
        make_face()
    extrude(amount=0.5, mode=Mode.SUBTRACT)

    # Fillet6: read off the stored shape, not the designer's step
    # Fillet6 outline → Fillet6 (add)
    with BuildSketch(Plane.XY.offset(FILLET6_START)):
        with BuildLine():
            Line((198.139271979, 1.225312831), (198.783763773, 2.532798575))
            ThreePointArc((198.783763773, 2.532798575), (197.836544352, 1.148706173), (196.5390625, 0.0859375))
            add(Edge.make_bspline(
                [(198.139271979, 1.225312831), (197.648837569, 0.72703147), (197.158971594, 0.22718261), (196.5390625, 0.0859375)],
                knots=[0, 0, 0, 0, 1, 1, 1, 1], degree=3))
        make_face()
    extrude(amount=FILLET6_DEPTH)

    # Fillet7
    fillet7_edges = [part.edges().sort_by_distance(p)[0] for p in [
        (320, 0, 1.5),
    ]]
    fillet(fillet7_edges, radius=FILLET7_R)

    # Fillet8: read off the stored shape, not the designer's step
    # Fillet8 outline → Fillet8 (add)
    with BuildSketch(Plane.XY.offset(FILLET8_START)):
        with BuildLine():
            add(Edge.make_bspline(
                [(173.4296875, -4.4609375), (172.5, -5.3671875), (171.19921875, -5.74609375), (169.8984375, -6.125)],
                knots=[0, 0, 0, 0, 1, 1, 1, 1], degree=3))
            ThreePointArc((173.4296875, -4.4609375), (170.068022443, -5.703138996), (166.509105501, -6.125))
            Line((166.509105501, -6.125), (169.8984375, -6.125))
        make_face()
        with BuildLine():
            Line((169.8671875, 5.5390625), (166.509105501, 5.5390625))
            ThreePointArc((166.509105501, 5.5390625), (170.068022443, 5.117201496), (173.4296875, 3.875))
            add(Edge.make_bspline(
                [(169.8671875, 5.5390625), (171.1796875, 5.16015625), (172.4921875, 4.78125), (173.4296875, 3.875)],
                knots=[0, 0, 0, 0, 1, 1, 1, 1], degree=3))
        make_face()
    extrude(amount=FILLET8_DEPTH)


solid = part.part
